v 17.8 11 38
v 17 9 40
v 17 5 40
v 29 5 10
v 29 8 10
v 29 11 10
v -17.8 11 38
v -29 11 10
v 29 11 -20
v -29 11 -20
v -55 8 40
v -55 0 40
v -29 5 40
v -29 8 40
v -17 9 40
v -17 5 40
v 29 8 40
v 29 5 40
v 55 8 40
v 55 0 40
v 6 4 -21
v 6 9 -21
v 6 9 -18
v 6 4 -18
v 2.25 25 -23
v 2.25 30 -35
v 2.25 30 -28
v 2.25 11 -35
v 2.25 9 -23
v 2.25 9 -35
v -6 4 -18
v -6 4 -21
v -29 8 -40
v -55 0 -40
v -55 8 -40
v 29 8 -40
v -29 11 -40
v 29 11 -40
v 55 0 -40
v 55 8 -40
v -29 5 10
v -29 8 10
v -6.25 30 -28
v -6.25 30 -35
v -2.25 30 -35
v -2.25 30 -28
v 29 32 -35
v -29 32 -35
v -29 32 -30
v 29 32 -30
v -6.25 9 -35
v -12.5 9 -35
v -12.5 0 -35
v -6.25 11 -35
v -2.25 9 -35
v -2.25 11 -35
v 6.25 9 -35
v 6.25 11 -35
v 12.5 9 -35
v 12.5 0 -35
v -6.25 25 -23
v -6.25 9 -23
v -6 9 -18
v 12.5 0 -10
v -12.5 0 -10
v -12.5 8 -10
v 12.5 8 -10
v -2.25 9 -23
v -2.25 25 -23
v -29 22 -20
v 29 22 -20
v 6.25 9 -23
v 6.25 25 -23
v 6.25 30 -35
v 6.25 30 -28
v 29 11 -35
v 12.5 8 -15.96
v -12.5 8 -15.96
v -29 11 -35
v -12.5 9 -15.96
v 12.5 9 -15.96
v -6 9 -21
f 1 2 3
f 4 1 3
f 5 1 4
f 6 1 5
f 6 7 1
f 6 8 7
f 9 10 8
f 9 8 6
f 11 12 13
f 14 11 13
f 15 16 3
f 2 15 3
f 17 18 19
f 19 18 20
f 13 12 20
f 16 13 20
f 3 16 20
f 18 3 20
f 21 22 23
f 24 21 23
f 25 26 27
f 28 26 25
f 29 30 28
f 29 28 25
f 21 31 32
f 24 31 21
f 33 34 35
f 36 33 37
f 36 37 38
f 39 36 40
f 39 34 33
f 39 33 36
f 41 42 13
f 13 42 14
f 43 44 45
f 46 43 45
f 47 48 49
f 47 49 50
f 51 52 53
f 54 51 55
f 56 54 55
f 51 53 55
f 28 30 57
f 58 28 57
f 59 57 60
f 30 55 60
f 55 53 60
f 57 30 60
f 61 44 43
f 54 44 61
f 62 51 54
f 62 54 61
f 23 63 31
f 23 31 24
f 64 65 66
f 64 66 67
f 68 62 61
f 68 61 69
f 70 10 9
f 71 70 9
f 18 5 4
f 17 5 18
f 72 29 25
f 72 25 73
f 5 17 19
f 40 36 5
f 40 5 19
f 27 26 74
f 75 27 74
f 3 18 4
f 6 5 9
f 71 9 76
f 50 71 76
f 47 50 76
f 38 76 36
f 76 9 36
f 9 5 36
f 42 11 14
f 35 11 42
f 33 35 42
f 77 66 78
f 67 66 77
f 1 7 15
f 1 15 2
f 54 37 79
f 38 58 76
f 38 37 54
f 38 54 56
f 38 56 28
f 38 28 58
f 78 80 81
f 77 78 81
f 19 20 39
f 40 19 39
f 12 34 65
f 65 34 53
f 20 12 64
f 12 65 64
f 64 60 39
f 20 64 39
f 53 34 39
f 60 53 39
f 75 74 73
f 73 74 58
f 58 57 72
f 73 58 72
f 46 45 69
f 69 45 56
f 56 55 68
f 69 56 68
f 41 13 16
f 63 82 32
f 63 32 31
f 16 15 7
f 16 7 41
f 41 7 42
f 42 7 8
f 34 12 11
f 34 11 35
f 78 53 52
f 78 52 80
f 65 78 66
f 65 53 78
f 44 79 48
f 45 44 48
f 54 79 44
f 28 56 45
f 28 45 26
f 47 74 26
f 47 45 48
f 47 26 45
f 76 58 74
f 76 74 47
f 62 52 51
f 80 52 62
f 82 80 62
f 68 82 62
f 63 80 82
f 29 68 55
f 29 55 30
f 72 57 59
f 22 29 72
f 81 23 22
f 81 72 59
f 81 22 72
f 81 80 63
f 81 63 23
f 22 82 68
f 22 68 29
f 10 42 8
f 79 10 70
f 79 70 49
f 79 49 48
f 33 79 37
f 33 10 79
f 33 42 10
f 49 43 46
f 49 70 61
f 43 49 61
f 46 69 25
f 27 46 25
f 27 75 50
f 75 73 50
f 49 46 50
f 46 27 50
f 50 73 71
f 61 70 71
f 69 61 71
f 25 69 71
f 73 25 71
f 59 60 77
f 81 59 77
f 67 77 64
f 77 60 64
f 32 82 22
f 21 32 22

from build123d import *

# Parameters (mm, degrees)
SKETCH_1_W          = 110
SKETCH_1_H          = 80
EXTRUDE_1_DEPTH     = 8
SKETCH_3_W          = 58
SKETCH_3_H          = 80
EXTRUDE_2_DEPTH     = 9
CUT_EXTRUDE_2_DEPTH = 6
CHAMFER_5_SIZE      = 2
SKETCH_10_W         = 58
SKETCH_10_H         = 15
EXTRUDE_5_DEPTH     = 30
CHAMFER_9_SIZE      = 10
SKETCH_11_W         = 4
SKETCH_11_H         = 12
CUT_EXTRUDE_6_DEPTH = 30
SKETCH_12_W         = 25
SKETCH_12_H         = 25
CUT_EXTRUDE_7_DEPTH = 9
SKETCH_13_W         = 12
SKETCH_13_H         = 3
EXTRUDE_6_DEPTH     = 5
SKETCH_14_W         = 25
SKETCH_14_H         = 5.959996218
EXTRUDE_7_DEPTH     = 1


with BuildPart() as part:
    # 草图1 → 凸台-拉伸1 (new body)
    with BuildSketch(Plane(origin=(0, 0, 0), x_dir=(1, 0, 0), z_dir=(0, 1, 0))):
        Rectangle(SKETCH_1_W, SKETCH_1_H)
    extrude(amount=EXTRUDE_1_DEPTH)

    # 草图3 → 凸台-拉伸2 (add)
    with BuildSketch(Plane(origin=(0, 2, 0), x_dir=(1, 0, 0), z_dir=(0, 1, 0))):
        Rectangle(SKETCH_3_W, SKETCH_3_H)
    extrude(amount=EXTRUDE_2_DEPTH)

    # 草图4 → 切除-拉伸2 (cut)
    with BuildSketch(Plane(origin=(0, 11, 0), x_dir=(1, 0, 0), z_dir=(0, 1, 0))):
        Polygon((-29, -10), (-29, -40), (-17, -40), align=None)
        Polygon((17, -40), (29, -10), (29, -40), align=None)
    extrude(amount=-CUT_EXTRUDE_2_DEPTH, mode=Mode.SUBTRACT)

    # 倒角5
    chamfer_5_edges = [part.edges().sort_by_distance(p)[0] for p in [
        (0, 11, 40),
    ]]
    chamfer(chamfer_5_edges, length=CHAMFER_5_SIZE)

    # 草图10 → 凸台-拉伸5 (add)
    with BuildSketch(Plane(origin=(0, 2, 0), x_dir=(1, 0, 0), z_dir=(0, 1, 0))):
        with Locations((0, 27.5)):
            Rectangle(SKETCH_10_W, SKETCH_10_H)
    extrude(amount=EXTRUDE_5_DEPTH)

    # 倒角9
    chamfer_9_edges = [part.edges().sort_by_distance(p)[0] for p in [
        (0, 32, -20),
    ]]
    chamfer(chamfer_9_edges, length=CHAMFER_9_SIZE)

    # 草图11 → 切除-拉伸6 (cut)
    with BuildSketch(Plane.XZ):
        with Locations((-4.25, -29)):
            Rectangle(SKETCH_11_W, SKETCH_11_H)
        with Locations((4.25, -29)):
            Rectangle(SKETCH_11_W, SKETCH_11_H)
    extrude(amount=-CUT_EXTRUDE_6_DEPTH, mode=Mode.SUBTRACT)

    # 草图12 → 切除-拉伸7 (cut)
    with BuildSketch(Plane.XZ):
        with Locations((0, -22.5)):
            Rectangle(SKETCH_12_W, SKETCH_12_H)
    extrude(amount=-CUT_EXTRUDE_7_DEPTH, mode=Mode.SUBTRACT)

    # 草图13 → 凸台-拉伸6 (add)
    with BuildSketch(Plane.XZ.offset(-9)):
        with Locations((0, -19.5)):
            Rectangle(SKETCH_13_W, SKETCH_13_H)
    extrude(amount=EXTRUDE_6_DEPTH)

    # 草图14 → 凸台-拉伸7 (add)
    with BuildSketch(Plane.XZ.offset(-9)):
        with Locations((0, -12.979998109)):
            Rectangle(SKETCH_14_W, SKETCH_14_H)
    extrude(amount=EXTRUDE_7_DEPTH)


solid = part.part
